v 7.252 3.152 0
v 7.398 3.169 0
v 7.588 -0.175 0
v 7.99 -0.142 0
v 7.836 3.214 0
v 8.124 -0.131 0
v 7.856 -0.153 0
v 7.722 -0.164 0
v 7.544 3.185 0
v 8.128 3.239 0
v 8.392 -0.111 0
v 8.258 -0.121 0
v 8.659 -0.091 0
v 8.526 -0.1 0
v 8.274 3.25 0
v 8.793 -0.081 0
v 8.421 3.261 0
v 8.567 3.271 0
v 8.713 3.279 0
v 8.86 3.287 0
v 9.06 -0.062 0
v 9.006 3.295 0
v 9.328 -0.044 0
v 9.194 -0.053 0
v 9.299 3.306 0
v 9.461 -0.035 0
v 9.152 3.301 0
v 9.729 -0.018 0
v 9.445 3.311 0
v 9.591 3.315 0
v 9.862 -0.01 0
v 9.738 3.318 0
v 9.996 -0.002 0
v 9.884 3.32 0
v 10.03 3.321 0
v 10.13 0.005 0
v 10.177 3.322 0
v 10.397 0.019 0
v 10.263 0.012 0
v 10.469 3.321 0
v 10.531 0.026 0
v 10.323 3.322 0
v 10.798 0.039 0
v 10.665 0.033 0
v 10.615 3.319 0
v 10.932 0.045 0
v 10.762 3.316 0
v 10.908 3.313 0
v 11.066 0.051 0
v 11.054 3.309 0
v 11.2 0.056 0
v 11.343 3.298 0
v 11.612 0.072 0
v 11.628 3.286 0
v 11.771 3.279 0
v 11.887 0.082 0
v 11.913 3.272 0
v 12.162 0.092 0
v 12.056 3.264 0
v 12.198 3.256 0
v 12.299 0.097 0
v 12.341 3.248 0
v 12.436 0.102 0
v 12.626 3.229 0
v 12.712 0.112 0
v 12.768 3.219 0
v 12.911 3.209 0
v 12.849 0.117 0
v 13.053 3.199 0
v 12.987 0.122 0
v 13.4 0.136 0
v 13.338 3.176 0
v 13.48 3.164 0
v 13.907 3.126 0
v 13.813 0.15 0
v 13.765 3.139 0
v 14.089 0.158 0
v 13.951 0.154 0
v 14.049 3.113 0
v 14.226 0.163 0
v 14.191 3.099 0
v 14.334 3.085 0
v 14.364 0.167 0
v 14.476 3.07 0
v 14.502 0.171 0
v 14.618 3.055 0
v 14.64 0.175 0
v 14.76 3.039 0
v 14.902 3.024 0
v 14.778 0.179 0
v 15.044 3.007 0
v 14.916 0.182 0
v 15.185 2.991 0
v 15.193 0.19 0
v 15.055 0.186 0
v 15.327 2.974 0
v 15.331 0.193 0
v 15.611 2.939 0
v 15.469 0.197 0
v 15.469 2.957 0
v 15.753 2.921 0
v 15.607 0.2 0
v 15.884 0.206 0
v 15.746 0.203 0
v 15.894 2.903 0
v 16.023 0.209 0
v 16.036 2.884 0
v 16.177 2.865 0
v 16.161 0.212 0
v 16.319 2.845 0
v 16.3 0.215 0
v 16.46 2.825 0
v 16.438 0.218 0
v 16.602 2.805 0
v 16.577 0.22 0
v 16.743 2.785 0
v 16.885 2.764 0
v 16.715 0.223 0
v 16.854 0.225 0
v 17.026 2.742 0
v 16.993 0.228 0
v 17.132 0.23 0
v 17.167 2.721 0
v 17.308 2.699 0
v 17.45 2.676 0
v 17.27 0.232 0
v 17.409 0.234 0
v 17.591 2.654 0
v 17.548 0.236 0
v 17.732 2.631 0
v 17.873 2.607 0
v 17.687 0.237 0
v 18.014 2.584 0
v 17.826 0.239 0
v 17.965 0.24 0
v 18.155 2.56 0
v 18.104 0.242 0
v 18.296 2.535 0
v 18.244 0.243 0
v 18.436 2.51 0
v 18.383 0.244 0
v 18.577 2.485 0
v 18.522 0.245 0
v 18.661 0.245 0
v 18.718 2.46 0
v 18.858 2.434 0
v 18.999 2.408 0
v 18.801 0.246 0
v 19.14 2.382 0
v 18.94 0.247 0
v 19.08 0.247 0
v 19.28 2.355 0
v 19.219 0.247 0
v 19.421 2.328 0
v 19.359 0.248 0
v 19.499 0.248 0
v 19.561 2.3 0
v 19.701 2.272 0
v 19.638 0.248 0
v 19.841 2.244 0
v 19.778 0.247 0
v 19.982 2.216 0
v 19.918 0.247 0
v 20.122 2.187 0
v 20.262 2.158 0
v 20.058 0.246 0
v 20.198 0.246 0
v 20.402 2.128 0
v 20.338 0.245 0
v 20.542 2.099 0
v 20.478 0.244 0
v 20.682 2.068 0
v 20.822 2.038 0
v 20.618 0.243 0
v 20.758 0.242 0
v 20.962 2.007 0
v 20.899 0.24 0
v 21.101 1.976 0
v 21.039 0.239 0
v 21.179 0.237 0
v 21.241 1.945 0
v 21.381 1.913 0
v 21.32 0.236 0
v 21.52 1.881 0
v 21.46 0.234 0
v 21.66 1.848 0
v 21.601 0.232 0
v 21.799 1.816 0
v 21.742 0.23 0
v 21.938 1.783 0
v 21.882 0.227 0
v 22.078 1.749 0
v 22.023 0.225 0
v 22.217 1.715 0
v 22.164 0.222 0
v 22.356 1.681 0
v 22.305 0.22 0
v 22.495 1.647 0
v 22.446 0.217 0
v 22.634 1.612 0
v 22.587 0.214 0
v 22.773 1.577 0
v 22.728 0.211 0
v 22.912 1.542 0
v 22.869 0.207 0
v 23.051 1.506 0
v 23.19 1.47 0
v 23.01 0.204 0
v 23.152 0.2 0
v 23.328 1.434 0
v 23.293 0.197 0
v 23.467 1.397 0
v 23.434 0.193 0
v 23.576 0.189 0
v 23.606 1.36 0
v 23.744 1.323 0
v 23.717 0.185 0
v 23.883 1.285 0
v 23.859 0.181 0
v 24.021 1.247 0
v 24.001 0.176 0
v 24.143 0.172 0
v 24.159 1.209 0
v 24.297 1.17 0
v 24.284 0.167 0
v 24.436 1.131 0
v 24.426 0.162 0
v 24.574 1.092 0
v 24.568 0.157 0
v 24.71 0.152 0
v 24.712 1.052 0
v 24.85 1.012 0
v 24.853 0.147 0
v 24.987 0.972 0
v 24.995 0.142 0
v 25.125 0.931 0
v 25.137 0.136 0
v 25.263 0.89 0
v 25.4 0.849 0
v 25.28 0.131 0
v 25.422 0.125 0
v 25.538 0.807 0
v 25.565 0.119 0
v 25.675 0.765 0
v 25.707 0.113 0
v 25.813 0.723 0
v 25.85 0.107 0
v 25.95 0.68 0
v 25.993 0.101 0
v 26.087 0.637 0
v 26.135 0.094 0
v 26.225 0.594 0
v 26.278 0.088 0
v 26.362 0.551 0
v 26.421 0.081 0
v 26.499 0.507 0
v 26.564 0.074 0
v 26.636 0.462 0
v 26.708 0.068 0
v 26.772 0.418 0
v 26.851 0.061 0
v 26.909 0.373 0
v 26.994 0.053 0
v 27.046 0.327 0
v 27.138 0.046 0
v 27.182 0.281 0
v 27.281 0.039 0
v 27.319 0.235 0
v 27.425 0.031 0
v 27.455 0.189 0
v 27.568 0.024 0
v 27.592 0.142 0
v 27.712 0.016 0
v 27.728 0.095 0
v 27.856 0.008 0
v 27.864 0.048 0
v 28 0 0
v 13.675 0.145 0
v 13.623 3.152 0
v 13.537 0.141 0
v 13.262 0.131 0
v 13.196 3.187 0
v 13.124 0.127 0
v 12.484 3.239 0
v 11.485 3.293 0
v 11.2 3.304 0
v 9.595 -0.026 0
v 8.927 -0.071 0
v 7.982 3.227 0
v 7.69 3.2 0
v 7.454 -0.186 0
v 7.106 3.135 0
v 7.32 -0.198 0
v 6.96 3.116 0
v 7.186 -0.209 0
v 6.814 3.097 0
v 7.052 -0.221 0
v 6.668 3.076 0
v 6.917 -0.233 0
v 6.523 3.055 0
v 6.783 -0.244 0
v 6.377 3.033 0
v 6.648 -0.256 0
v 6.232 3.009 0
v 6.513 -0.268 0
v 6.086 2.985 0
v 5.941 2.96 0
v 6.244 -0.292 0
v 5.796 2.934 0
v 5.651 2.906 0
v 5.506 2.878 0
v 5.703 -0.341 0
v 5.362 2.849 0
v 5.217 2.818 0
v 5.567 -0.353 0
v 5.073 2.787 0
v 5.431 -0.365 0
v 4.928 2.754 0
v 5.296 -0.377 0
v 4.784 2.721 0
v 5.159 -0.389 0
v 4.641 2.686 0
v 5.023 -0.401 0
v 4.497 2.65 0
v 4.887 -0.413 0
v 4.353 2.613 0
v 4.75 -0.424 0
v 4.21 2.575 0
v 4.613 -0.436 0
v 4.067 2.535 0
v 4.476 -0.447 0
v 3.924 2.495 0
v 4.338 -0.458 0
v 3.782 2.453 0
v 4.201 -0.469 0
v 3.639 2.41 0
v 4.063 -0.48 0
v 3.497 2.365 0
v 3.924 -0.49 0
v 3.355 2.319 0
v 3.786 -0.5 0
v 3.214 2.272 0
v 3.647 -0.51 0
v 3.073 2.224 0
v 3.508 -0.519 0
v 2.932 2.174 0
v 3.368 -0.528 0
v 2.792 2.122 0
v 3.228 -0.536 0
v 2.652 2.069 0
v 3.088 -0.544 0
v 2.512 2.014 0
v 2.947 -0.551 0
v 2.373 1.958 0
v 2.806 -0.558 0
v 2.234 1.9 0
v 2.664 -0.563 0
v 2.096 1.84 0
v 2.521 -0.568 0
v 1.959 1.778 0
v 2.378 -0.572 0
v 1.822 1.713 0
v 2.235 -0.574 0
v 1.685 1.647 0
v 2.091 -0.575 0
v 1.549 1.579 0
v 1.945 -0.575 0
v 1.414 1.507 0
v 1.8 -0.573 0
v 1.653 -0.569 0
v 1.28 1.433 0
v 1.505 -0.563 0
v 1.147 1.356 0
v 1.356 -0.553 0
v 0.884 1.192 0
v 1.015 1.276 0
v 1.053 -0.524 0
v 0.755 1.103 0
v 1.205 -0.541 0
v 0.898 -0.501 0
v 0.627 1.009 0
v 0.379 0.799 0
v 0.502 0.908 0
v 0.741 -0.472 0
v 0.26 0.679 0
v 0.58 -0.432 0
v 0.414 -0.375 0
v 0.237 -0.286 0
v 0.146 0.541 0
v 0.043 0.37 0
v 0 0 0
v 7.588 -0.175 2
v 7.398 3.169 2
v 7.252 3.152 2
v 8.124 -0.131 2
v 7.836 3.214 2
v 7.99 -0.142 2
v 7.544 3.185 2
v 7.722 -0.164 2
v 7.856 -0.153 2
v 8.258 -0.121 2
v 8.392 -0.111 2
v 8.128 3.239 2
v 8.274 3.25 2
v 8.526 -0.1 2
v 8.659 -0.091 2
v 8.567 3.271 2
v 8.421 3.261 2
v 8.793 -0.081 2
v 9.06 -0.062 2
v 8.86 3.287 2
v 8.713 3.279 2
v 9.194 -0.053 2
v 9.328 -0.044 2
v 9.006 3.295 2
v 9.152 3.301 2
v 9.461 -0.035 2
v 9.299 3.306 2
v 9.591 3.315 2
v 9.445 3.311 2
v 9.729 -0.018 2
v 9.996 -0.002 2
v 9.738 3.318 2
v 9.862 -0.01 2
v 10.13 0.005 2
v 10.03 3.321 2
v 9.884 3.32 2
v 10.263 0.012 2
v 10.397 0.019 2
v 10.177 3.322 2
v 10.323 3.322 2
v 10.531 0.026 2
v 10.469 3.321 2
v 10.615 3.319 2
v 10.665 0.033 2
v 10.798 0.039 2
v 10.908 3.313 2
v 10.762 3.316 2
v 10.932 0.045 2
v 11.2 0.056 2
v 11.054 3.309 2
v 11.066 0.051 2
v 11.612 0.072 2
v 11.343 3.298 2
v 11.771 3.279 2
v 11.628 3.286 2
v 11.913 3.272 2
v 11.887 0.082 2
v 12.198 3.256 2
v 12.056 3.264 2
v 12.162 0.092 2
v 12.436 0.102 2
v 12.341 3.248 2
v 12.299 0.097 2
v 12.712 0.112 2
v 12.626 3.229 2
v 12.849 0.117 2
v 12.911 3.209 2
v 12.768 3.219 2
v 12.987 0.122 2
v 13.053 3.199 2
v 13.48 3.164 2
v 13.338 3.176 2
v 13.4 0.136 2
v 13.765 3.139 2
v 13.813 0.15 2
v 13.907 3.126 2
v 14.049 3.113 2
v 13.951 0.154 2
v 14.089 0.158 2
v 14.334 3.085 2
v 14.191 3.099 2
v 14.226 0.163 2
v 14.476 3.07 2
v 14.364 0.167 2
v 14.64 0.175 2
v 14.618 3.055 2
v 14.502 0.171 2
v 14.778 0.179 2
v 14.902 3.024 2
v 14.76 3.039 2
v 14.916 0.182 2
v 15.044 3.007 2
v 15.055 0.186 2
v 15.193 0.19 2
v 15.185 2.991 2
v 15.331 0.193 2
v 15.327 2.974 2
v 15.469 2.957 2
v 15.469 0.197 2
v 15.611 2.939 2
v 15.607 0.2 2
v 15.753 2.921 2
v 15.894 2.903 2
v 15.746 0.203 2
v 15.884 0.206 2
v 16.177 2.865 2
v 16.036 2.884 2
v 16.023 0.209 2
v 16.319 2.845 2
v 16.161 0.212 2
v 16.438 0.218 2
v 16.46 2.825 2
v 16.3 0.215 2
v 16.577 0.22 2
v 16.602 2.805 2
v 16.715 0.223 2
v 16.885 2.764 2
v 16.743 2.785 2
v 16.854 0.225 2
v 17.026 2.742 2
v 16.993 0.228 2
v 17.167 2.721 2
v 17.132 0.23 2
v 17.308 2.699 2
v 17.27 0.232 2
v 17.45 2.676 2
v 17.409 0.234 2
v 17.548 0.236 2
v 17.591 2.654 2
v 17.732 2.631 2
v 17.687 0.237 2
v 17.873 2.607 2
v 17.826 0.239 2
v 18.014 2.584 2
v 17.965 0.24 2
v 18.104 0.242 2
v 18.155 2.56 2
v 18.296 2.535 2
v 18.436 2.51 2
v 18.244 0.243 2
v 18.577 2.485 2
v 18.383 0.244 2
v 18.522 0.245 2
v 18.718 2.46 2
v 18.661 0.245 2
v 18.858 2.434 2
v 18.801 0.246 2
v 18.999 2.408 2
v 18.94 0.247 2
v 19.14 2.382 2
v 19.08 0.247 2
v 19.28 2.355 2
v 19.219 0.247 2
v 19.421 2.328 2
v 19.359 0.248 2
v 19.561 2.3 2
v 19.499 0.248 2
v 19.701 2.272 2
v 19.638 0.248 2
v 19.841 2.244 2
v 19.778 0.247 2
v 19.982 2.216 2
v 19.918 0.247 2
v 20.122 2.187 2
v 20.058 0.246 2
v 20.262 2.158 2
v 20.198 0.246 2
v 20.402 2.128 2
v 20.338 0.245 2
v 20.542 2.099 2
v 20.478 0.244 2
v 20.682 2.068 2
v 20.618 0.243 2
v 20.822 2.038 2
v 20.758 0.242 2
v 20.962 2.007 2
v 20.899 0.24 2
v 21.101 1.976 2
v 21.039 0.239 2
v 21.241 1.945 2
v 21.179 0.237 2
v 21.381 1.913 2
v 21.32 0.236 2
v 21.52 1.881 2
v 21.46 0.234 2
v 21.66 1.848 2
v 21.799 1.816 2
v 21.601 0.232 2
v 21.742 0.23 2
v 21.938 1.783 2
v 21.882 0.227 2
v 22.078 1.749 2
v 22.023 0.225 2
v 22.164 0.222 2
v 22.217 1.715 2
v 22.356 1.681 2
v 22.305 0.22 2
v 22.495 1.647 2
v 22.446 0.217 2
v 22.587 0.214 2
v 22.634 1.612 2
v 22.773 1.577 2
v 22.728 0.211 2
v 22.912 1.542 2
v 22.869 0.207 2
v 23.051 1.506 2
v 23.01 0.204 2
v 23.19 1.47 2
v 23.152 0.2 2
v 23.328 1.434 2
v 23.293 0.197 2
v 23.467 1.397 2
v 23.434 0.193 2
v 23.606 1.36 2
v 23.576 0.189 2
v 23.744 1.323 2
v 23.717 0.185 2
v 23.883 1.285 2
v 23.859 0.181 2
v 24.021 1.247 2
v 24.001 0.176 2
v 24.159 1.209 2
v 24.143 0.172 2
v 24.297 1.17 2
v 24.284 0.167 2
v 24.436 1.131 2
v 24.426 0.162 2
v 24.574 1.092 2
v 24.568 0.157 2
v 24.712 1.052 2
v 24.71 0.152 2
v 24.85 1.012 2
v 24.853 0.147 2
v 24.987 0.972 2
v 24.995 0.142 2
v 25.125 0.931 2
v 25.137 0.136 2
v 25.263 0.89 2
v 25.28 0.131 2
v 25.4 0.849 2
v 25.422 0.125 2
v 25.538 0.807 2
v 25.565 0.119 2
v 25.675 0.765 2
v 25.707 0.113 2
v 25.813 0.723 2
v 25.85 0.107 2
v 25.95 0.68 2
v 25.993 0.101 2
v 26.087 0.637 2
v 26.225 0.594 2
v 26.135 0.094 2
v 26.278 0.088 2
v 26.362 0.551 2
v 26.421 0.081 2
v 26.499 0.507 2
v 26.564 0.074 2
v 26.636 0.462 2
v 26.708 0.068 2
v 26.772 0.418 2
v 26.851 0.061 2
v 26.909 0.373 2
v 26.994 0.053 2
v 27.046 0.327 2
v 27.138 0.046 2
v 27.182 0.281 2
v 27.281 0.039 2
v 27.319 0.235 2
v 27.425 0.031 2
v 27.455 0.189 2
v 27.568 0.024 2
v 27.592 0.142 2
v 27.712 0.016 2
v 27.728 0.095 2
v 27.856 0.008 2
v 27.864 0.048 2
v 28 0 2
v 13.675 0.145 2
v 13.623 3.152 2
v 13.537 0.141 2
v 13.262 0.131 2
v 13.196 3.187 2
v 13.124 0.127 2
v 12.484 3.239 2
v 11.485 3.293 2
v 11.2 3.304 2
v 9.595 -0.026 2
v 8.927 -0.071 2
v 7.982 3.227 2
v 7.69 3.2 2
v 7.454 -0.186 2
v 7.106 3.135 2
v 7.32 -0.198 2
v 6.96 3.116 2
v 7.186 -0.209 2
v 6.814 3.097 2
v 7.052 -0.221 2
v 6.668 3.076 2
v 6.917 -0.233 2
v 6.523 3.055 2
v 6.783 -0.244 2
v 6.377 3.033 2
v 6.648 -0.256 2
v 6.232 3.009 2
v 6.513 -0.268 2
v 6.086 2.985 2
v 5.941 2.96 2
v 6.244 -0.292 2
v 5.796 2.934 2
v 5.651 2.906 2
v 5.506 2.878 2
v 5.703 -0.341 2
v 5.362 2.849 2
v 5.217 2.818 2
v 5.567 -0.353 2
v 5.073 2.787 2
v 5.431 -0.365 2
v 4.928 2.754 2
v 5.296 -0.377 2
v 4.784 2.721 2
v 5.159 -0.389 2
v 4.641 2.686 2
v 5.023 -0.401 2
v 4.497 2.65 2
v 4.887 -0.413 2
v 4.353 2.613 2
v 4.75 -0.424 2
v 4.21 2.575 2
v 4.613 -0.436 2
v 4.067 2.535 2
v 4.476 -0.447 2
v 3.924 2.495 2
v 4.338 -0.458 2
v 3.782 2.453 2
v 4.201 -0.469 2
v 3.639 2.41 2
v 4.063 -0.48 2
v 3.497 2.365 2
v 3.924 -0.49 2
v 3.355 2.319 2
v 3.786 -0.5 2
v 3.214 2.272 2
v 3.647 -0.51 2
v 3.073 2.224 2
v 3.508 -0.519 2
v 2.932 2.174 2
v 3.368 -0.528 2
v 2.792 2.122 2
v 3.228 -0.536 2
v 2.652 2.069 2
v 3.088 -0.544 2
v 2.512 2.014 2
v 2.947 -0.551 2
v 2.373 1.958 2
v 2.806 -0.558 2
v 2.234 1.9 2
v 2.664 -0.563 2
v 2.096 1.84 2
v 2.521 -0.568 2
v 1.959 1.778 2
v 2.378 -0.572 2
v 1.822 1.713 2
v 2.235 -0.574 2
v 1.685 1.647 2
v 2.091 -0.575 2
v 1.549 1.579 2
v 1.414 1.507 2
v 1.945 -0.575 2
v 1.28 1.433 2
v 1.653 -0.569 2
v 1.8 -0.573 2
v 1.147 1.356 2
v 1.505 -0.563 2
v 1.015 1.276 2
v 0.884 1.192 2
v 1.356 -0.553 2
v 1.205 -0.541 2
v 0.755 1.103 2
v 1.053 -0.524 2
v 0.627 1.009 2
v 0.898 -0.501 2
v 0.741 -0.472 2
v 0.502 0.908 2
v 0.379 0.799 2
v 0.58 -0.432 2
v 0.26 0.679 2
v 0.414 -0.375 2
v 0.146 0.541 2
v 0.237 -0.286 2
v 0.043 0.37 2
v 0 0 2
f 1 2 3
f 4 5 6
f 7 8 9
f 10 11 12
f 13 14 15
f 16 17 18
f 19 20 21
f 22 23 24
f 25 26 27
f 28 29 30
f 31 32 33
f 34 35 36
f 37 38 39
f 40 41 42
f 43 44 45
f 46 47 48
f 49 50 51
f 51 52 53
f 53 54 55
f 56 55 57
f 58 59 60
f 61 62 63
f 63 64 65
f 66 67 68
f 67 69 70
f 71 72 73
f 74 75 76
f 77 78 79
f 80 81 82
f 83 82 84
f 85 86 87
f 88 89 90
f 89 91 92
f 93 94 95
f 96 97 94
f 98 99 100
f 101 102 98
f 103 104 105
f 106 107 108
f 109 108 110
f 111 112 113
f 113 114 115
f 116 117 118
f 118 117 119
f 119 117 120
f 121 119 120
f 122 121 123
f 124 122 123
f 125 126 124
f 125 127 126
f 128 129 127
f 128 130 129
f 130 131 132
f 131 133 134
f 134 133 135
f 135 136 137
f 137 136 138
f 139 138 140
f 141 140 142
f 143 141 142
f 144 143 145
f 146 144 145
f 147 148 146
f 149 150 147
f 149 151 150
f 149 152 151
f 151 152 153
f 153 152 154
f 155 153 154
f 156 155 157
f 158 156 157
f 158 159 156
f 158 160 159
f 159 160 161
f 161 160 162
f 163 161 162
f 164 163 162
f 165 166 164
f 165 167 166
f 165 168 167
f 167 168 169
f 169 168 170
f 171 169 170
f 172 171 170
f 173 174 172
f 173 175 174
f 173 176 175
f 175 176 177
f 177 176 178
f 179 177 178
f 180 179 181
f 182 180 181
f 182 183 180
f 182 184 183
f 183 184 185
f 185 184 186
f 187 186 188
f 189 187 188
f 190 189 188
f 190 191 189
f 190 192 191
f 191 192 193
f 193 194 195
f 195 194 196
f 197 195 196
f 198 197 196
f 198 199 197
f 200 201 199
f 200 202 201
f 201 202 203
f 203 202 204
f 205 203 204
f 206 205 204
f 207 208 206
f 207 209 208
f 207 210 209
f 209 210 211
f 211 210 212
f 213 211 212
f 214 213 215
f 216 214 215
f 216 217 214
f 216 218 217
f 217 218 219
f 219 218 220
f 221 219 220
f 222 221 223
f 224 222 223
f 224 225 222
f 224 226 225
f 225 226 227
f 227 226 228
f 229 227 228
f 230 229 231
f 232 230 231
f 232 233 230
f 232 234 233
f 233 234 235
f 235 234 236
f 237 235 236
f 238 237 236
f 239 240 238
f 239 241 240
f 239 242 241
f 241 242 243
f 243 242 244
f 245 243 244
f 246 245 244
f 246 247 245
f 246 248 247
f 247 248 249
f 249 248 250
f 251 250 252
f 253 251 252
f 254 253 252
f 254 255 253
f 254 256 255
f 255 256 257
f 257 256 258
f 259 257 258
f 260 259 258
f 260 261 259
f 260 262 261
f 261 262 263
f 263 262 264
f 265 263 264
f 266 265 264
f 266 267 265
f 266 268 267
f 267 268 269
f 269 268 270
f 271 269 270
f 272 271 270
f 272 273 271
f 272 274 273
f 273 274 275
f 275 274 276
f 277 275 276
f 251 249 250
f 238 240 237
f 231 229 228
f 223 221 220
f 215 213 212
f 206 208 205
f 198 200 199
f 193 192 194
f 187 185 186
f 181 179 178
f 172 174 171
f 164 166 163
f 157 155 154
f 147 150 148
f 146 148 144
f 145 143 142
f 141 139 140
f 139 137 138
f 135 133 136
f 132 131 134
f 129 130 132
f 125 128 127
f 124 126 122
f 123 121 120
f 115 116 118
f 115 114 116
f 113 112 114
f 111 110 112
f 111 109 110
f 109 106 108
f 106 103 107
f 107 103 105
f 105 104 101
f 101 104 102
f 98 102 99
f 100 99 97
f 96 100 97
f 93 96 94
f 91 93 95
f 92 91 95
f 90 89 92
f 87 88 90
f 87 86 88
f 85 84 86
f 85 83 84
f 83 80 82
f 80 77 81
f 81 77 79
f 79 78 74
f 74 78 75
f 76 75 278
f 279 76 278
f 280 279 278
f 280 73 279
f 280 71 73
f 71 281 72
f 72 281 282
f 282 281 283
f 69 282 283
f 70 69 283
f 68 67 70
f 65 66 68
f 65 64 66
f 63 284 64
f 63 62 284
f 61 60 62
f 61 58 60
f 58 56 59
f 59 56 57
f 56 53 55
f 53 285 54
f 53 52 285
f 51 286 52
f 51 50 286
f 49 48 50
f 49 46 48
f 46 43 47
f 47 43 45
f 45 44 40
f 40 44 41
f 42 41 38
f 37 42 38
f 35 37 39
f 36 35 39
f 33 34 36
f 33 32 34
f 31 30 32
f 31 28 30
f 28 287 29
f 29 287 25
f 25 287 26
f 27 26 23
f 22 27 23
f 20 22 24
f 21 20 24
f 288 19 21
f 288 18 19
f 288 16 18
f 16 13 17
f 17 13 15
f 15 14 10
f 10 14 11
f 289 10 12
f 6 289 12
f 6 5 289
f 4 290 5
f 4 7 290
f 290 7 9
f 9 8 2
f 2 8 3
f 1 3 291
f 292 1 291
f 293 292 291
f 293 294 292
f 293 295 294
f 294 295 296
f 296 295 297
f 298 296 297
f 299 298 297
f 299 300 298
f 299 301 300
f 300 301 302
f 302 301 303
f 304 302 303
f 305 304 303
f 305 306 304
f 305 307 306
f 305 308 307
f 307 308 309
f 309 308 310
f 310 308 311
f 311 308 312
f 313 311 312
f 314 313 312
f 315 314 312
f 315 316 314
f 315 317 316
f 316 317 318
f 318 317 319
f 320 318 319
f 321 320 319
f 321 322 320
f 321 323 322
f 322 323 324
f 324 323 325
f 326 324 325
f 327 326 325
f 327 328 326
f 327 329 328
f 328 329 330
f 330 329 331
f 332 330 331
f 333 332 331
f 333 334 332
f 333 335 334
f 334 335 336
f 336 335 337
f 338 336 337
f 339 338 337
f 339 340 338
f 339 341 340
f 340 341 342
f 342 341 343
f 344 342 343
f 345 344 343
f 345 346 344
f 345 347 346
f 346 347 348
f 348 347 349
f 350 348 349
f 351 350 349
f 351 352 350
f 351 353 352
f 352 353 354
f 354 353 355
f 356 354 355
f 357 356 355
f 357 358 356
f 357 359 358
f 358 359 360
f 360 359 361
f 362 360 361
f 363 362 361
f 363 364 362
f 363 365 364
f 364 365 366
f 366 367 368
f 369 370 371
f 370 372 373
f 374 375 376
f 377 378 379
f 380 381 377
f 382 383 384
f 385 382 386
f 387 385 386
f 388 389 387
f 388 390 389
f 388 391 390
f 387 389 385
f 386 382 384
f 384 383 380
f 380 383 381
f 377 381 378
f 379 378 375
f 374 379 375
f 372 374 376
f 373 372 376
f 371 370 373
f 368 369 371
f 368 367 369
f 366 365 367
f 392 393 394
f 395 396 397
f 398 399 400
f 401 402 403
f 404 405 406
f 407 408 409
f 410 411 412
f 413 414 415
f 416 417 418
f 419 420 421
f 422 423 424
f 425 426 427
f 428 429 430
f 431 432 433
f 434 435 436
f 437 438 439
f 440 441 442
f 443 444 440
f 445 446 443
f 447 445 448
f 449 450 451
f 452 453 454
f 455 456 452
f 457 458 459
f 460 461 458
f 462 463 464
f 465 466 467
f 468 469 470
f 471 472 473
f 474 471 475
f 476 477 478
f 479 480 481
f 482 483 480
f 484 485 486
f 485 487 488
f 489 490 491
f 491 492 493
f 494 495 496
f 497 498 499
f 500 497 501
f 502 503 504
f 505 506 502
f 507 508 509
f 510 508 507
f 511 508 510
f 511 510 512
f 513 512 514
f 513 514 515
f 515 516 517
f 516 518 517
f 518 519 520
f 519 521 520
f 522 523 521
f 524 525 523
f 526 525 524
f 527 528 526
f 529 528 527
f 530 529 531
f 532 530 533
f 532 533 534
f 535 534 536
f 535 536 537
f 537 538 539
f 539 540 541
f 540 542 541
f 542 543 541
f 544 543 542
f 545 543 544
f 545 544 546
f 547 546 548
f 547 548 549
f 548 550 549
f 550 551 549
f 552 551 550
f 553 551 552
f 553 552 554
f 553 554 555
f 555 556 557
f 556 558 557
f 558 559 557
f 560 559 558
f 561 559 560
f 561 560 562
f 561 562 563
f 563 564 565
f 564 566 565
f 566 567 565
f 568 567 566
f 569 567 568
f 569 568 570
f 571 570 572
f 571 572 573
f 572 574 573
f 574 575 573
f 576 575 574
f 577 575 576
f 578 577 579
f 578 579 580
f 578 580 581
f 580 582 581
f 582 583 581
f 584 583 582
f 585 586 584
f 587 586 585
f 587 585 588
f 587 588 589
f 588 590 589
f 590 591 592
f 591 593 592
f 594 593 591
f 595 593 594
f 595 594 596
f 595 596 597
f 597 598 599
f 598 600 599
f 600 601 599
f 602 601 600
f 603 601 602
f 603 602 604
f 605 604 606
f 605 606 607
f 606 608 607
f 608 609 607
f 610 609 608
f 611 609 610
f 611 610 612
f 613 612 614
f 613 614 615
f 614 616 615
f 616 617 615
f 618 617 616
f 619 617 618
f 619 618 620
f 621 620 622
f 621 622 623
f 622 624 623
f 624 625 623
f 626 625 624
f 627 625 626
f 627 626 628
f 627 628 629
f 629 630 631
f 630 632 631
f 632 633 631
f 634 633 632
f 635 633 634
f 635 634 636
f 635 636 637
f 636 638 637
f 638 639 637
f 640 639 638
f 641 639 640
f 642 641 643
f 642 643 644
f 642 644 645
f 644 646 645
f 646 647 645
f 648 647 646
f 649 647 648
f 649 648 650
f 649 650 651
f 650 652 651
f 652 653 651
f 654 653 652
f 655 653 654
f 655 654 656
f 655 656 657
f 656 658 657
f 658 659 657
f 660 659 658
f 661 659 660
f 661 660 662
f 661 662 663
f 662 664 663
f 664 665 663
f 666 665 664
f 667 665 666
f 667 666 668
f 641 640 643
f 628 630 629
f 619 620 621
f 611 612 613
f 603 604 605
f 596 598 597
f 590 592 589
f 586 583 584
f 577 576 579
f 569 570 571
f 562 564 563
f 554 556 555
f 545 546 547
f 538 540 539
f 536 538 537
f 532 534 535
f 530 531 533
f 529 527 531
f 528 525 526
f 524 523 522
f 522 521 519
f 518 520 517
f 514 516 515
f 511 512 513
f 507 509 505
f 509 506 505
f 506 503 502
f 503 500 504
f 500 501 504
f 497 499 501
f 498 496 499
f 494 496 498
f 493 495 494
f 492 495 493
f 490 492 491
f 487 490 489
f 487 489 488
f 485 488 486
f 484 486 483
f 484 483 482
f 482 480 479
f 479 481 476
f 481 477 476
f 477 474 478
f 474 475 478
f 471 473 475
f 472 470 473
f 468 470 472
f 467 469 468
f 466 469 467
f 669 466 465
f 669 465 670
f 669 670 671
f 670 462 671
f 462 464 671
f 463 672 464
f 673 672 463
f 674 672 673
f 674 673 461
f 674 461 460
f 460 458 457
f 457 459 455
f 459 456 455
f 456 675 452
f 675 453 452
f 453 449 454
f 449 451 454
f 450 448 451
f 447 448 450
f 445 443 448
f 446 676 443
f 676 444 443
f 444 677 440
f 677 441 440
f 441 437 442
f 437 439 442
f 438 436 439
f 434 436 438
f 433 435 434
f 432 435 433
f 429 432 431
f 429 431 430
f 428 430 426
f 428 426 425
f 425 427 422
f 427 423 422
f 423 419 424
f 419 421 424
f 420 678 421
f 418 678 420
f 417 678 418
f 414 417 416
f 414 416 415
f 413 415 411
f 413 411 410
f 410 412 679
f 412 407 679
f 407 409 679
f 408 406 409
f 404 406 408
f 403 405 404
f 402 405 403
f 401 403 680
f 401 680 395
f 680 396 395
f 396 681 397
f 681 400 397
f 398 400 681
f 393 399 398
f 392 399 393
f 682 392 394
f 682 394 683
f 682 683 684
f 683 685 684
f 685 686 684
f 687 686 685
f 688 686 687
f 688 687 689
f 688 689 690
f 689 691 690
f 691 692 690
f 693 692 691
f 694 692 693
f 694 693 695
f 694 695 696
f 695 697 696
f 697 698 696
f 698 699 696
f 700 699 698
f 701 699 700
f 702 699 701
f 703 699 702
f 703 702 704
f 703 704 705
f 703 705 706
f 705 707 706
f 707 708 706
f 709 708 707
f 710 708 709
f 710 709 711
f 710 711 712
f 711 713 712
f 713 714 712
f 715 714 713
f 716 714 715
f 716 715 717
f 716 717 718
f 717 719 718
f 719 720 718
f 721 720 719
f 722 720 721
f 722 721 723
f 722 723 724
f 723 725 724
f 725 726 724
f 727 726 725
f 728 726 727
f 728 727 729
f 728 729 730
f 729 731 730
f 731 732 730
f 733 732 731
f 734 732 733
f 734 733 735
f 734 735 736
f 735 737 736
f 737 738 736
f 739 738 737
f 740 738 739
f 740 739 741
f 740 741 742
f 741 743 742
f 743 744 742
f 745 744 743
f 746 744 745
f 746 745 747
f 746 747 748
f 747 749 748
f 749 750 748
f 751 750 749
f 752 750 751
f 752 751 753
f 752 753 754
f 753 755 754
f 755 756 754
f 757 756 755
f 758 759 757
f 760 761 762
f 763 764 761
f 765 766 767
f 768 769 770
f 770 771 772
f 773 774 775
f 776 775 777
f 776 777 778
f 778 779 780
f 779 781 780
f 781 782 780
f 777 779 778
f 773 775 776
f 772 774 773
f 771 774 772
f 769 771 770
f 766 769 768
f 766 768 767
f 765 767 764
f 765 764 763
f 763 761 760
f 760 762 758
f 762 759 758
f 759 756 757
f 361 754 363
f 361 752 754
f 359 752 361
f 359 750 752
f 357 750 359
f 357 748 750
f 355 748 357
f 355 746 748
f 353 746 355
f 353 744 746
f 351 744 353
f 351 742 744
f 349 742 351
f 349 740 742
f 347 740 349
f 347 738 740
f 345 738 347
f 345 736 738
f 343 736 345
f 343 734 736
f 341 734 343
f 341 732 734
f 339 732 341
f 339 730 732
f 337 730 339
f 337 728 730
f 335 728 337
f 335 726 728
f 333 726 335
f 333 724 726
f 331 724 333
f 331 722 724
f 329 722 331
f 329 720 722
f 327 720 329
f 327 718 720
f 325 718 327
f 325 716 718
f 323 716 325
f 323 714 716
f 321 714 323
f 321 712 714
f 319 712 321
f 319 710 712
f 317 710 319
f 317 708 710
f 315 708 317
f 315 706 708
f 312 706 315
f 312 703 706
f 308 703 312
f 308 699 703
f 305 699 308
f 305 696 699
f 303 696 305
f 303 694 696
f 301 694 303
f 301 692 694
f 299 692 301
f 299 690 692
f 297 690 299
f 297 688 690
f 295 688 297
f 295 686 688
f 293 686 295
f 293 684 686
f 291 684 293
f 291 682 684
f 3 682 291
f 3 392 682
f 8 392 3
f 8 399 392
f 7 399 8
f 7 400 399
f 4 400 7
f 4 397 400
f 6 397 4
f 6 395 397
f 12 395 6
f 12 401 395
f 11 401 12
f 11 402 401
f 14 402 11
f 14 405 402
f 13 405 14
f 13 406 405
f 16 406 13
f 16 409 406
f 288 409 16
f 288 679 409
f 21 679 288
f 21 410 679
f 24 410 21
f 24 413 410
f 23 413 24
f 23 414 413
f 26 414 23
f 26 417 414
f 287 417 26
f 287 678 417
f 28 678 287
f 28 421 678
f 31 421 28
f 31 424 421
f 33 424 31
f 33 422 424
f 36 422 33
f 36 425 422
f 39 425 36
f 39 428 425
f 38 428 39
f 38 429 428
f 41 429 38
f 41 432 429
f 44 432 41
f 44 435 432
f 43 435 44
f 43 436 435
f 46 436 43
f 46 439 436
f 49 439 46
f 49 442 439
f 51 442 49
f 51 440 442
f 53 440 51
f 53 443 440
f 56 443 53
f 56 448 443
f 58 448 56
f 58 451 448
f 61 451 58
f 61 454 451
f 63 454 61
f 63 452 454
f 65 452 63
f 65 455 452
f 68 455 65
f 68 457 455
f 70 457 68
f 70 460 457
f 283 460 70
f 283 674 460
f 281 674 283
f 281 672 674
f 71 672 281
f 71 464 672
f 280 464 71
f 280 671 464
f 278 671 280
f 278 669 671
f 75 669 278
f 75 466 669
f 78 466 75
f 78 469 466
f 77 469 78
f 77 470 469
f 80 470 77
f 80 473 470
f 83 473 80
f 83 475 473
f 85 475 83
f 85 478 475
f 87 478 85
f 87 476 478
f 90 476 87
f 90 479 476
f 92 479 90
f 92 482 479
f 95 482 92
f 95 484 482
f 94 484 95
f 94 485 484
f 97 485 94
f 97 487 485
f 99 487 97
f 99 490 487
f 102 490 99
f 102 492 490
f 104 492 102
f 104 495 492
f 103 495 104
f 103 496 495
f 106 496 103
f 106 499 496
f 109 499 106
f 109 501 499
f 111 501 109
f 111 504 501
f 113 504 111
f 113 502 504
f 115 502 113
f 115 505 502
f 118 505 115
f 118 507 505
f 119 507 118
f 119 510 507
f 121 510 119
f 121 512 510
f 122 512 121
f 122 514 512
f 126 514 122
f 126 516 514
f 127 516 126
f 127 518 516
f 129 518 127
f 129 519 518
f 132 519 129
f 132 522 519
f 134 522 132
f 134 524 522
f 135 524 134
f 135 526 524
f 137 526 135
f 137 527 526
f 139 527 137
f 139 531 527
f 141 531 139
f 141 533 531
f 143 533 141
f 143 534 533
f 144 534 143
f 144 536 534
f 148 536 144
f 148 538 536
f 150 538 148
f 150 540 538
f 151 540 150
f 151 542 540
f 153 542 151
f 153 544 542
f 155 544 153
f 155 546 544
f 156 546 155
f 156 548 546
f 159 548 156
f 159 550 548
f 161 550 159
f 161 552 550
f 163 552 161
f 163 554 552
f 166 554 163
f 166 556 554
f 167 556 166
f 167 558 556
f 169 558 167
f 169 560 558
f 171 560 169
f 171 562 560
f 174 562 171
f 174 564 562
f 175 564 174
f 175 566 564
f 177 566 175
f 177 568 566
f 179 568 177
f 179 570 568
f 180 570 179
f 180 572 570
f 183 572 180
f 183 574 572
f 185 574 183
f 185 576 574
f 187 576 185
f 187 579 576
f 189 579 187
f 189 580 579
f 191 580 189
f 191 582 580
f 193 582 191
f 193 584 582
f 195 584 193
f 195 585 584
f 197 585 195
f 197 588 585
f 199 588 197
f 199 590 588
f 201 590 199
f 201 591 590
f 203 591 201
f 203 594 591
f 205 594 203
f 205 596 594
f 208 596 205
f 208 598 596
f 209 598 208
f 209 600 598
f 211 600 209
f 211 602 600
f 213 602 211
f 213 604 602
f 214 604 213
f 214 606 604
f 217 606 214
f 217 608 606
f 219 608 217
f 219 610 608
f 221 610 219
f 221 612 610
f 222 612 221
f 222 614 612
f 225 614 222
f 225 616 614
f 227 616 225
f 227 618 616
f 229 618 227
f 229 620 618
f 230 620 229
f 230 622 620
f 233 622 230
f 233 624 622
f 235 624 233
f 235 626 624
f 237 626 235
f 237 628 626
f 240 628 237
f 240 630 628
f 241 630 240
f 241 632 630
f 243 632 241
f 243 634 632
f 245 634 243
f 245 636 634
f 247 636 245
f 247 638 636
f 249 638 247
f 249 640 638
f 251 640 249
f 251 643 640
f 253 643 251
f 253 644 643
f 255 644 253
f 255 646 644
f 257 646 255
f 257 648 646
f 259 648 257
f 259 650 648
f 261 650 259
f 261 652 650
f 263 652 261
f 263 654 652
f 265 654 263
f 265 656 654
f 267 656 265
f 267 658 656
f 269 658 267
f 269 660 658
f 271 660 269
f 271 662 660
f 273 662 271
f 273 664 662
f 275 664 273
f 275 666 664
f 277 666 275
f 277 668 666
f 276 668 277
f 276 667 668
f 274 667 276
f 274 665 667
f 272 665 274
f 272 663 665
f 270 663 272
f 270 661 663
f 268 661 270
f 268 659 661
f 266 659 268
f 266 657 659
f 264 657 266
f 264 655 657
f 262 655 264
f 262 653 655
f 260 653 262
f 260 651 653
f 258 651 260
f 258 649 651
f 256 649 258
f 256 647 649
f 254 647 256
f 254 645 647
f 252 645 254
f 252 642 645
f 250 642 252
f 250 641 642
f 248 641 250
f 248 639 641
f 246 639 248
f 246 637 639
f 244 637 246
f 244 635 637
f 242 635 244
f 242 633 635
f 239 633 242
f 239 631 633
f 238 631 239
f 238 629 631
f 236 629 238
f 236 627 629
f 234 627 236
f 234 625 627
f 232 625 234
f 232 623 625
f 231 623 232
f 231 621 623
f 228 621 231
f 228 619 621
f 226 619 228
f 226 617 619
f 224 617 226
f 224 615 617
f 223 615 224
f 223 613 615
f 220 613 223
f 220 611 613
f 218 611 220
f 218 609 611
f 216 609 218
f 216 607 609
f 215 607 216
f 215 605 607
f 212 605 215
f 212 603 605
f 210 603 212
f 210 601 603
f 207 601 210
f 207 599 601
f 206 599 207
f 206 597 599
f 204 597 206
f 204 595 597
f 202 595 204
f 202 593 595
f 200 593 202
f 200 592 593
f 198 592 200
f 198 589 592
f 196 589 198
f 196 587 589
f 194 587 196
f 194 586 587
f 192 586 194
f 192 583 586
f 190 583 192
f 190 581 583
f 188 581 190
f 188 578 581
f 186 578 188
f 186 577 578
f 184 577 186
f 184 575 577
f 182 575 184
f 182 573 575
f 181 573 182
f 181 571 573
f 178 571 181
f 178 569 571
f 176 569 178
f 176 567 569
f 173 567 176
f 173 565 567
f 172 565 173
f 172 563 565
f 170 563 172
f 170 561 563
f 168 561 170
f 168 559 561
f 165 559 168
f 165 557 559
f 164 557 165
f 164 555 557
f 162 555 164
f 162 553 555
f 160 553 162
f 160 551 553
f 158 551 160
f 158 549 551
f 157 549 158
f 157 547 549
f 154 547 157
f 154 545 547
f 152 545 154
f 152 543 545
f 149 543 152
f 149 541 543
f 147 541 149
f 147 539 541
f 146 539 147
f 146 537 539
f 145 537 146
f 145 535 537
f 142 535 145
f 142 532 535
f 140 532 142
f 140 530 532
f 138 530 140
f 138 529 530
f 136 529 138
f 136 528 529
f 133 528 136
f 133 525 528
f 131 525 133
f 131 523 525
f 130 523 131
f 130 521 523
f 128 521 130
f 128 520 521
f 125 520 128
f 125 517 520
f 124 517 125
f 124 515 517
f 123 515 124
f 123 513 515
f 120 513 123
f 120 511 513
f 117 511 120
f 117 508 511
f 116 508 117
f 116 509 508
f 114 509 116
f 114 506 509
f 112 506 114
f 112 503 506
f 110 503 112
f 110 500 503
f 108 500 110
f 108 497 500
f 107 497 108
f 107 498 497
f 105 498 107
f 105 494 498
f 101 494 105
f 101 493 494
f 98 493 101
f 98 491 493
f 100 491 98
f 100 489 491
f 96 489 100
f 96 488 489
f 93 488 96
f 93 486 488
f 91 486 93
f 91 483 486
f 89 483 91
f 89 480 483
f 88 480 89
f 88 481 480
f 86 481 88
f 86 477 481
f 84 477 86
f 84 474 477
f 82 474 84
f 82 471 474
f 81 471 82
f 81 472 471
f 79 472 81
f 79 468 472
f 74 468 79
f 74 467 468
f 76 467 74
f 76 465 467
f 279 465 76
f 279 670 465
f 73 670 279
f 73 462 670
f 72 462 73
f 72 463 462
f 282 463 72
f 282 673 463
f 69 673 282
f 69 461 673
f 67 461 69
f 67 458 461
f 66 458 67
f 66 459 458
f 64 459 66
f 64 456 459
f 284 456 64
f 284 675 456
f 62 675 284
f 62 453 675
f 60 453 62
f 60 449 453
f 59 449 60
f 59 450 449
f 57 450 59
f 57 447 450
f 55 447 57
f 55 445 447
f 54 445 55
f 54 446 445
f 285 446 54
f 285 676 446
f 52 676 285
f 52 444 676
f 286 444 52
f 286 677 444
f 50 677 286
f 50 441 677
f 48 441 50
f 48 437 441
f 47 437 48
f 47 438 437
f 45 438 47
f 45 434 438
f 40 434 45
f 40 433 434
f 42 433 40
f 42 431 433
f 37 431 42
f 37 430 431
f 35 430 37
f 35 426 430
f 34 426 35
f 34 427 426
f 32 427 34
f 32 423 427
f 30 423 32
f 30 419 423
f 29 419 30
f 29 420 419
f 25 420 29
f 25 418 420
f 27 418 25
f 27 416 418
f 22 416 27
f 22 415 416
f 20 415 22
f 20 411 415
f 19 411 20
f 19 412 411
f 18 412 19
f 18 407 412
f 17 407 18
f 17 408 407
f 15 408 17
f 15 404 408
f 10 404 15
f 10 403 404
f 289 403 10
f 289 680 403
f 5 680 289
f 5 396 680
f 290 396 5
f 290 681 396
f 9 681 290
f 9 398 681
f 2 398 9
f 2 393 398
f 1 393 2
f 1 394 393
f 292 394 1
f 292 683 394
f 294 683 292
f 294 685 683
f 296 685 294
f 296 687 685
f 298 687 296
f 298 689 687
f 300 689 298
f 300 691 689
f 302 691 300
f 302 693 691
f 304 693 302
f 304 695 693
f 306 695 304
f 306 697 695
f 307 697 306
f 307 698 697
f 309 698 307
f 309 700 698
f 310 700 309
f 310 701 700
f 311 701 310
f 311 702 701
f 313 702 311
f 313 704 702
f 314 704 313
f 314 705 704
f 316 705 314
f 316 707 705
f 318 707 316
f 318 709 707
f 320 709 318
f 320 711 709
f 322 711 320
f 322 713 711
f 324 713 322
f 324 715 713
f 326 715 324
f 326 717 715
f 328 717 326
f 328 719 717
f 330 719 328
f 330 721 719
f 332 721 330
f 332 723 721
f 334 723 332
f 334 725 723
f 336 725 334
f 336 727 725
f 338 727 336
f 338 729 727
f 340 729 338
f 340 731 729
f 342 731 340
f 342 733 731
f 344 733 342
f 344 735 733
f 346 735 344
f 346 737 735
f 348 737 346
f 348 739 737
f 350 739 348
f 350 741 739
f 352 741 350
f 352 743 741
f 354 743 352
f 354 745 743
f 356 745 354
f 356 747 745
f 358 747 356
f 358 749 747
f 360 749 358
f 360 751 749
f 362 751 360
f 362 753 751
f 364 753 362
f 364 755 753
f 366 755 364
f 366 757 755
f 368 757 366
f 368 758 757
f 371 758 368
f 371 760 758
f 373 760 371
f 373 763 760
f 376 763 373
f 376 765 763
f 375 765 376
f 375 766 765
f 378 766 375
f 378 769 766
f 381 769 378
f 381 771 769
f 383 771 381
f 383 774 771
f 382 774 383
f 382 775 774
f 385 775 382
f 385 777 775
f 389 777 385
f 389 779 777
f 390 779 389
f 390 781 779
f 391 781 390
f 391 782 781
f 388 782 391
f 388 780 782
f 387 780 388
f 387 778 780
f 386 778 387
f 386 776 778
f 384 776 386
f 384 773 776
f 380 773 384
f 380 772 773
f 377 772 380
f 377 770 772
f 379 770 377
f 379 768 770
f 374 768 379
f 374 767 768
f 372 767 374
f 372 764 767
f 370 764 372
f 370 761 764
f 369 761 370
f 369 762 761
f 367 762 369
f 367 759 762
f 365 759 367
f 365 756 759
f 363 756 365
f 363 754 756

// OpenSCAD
$fn = 1200;

// NACA 四位数半厚度分布
function naca_thickness(x, t) =
    5 * t * (
        0.2969 * sqrt(x)
      - 0.1260 * x
      - 0.3516 * x * x
      + 0.2843 * x * x * x
      - 0.1036 * x * x * x * x
    );

// 中弧线 yc
function camber_y(x, m, p) =
    (x <= p)
    ? m / (p * p) * (2 * p * x - x * x)
    : m / ((1 - p) * (1 - p)) * ((1 - 2 * p) + 2 * p * x - x * x);

// 中弧线斜率 dyc/dx
function camber_dy(x, m, p) =
    (x <= p)
    ? 2 * m / (p * p) * (p - x)
    : 2 * m / ((1 - p) * (1 - p)) * (p - x);

// 上表面单点
function airfoil_upper_pt(x, m, p, t, chord) =
    let(
        yc = camber_y(x, m, p),
        dyc = camber_dy(x, m, p),
        yt = naca_thickness(x, t),
        theta = atan(dyc),
        xu = x - yt * sin(theta),
        yu = yc + yt * cos(theta)
    )
    [xu * chord, yu * chord];

// 下表面单点
function airfoil_lower_pt(x, m, p, t, chord) =
    let(
        yc = camber_y(x, m, p),
        dyc = camber_dy(x, m, p),
        yt = naca_thickness(x, t),
        theta = atan(dyc),
        xl = x + yt * sin(theta),
        yl = yc - yt * cos(theta)
    )
    [xl * chord, yl * chord];

// 中弧线单点
function airfoil_camber_pt(x, m, p, chord) =
    [x * chord, camber_y(x, m, p) * chord];

// 上表面点集：前缘 -> 尾缘
function airfoil_upper_points(m, p, t, num_points, chord) =
    [ for (i = [0 : num_points])
        airfoil_upper_pt(i / num_points, m, p, t, chord)
    ];

// 下表面点集：尾缘 -> 前缘
function airfoil_lower_points_rev(m, p, t, num_points, chord) =
    [ for (i = [num_points : -1 : 0])
        airfoil_lower_pt(i / num_points, m, p, t, chord)
    ];

// 封闭翼型点集
function airfoil_polygon_points(m, p, t, num_points, chord) =
    concat(
        airfoil_upper_points(m, p, t, num_points, chord),
        airfoil_lower_points_rev(m, p, t, num_points, chord)
    );


// 中弧线点集
function airfoil_camber_points(m, p, num_points, chord) =
    [ for (i = [0 : num_points])
        airfoil_camber_pt(i / num_points, m, p, chord)
    ];



// =======================================================
// 子模块
// =======================================================

// 2D 截面
module airfoil_2d_profile(
    m = 0.06,
    p = 0.40,
    t = 0.12,
    num_points = 180,
    chord = 100
) {
    polygon(points = airfoil_polygon_points(m, p, t, num_points, chord));
}

// 2D 中弧线（用小圆点表示）
module airfoil_2d_camber_line(
    m = 0.06,
    p = 0.40,
    num_points = 180,
    chord = 100,
    dot_r = 0.35
) {
    pts = airfoil_camber_points(m, p, num_points, chord);
    for (pt = pts) {
        translate(pt) circle(r = dot_r);
    }
}

// 3D 拉伸版本
module airfoil_3d_profile(
    m = 0.06,
    p = 0.40,
    t = 0.12,
    num_points = 180,
    chord = 100,
    width = 20,
    center = true
) {
    linear_extrude(height = width, center = center)
        airfoil_2d_profile(
            m = m,
            p = p,
            t = t,
            num_points = num_points,
            chord = chord
        );
}



// =======================================================
// 主模块
// mode:
//   "2d"      -> 只画二维截面
//   "2d+c"    -> 画二维截面 + 中弧线
//   "3d"      -> 拉伸成三维
// =======================================================
module centrifugal_blade_airfoil(
    m = 0.06,
    p = 0.40,
    t = 0.12,
    num_points = 180,
    chord = 100,
    mode = "2d+c",
    width = 20,
    camber_dot_r = 0.35,
    center_3d = true
) {
    if (mode == "2d") {
        airfoil_2d_profile(
            m = m,
            p = p,
            t = t,
            num_points = num_points,
            chord = chord
        );
    }
    else if (mode == "2d+c") {
        airfoil_2d_profile(
            m = m,
            p = p,
            t = t,
            num_points = num_points,
            chord = chord
        );

        airfoil_2d_camber_line(
            m = m,
            p = p,
            num_points = num_points,
            chord = chord,
            dot_r = camber_dot_r
        );
    }
    else if (mode == "3d") {
        airfoil_3d_profile(
            m = m,
            p = p,
            t = t,
            num_points = num_points,
            chord = chord,
            width = width,
            center = center_3d
        );
    }
}


color("silver")
    centrifugal_blade_airfoil(
        m = 0.06,
        p = 0.40,
        t = 0.12,
        num_points = 200,
        chord = 28,
        mode = "3d",
        width = 2,
        center_3d = false
    );
